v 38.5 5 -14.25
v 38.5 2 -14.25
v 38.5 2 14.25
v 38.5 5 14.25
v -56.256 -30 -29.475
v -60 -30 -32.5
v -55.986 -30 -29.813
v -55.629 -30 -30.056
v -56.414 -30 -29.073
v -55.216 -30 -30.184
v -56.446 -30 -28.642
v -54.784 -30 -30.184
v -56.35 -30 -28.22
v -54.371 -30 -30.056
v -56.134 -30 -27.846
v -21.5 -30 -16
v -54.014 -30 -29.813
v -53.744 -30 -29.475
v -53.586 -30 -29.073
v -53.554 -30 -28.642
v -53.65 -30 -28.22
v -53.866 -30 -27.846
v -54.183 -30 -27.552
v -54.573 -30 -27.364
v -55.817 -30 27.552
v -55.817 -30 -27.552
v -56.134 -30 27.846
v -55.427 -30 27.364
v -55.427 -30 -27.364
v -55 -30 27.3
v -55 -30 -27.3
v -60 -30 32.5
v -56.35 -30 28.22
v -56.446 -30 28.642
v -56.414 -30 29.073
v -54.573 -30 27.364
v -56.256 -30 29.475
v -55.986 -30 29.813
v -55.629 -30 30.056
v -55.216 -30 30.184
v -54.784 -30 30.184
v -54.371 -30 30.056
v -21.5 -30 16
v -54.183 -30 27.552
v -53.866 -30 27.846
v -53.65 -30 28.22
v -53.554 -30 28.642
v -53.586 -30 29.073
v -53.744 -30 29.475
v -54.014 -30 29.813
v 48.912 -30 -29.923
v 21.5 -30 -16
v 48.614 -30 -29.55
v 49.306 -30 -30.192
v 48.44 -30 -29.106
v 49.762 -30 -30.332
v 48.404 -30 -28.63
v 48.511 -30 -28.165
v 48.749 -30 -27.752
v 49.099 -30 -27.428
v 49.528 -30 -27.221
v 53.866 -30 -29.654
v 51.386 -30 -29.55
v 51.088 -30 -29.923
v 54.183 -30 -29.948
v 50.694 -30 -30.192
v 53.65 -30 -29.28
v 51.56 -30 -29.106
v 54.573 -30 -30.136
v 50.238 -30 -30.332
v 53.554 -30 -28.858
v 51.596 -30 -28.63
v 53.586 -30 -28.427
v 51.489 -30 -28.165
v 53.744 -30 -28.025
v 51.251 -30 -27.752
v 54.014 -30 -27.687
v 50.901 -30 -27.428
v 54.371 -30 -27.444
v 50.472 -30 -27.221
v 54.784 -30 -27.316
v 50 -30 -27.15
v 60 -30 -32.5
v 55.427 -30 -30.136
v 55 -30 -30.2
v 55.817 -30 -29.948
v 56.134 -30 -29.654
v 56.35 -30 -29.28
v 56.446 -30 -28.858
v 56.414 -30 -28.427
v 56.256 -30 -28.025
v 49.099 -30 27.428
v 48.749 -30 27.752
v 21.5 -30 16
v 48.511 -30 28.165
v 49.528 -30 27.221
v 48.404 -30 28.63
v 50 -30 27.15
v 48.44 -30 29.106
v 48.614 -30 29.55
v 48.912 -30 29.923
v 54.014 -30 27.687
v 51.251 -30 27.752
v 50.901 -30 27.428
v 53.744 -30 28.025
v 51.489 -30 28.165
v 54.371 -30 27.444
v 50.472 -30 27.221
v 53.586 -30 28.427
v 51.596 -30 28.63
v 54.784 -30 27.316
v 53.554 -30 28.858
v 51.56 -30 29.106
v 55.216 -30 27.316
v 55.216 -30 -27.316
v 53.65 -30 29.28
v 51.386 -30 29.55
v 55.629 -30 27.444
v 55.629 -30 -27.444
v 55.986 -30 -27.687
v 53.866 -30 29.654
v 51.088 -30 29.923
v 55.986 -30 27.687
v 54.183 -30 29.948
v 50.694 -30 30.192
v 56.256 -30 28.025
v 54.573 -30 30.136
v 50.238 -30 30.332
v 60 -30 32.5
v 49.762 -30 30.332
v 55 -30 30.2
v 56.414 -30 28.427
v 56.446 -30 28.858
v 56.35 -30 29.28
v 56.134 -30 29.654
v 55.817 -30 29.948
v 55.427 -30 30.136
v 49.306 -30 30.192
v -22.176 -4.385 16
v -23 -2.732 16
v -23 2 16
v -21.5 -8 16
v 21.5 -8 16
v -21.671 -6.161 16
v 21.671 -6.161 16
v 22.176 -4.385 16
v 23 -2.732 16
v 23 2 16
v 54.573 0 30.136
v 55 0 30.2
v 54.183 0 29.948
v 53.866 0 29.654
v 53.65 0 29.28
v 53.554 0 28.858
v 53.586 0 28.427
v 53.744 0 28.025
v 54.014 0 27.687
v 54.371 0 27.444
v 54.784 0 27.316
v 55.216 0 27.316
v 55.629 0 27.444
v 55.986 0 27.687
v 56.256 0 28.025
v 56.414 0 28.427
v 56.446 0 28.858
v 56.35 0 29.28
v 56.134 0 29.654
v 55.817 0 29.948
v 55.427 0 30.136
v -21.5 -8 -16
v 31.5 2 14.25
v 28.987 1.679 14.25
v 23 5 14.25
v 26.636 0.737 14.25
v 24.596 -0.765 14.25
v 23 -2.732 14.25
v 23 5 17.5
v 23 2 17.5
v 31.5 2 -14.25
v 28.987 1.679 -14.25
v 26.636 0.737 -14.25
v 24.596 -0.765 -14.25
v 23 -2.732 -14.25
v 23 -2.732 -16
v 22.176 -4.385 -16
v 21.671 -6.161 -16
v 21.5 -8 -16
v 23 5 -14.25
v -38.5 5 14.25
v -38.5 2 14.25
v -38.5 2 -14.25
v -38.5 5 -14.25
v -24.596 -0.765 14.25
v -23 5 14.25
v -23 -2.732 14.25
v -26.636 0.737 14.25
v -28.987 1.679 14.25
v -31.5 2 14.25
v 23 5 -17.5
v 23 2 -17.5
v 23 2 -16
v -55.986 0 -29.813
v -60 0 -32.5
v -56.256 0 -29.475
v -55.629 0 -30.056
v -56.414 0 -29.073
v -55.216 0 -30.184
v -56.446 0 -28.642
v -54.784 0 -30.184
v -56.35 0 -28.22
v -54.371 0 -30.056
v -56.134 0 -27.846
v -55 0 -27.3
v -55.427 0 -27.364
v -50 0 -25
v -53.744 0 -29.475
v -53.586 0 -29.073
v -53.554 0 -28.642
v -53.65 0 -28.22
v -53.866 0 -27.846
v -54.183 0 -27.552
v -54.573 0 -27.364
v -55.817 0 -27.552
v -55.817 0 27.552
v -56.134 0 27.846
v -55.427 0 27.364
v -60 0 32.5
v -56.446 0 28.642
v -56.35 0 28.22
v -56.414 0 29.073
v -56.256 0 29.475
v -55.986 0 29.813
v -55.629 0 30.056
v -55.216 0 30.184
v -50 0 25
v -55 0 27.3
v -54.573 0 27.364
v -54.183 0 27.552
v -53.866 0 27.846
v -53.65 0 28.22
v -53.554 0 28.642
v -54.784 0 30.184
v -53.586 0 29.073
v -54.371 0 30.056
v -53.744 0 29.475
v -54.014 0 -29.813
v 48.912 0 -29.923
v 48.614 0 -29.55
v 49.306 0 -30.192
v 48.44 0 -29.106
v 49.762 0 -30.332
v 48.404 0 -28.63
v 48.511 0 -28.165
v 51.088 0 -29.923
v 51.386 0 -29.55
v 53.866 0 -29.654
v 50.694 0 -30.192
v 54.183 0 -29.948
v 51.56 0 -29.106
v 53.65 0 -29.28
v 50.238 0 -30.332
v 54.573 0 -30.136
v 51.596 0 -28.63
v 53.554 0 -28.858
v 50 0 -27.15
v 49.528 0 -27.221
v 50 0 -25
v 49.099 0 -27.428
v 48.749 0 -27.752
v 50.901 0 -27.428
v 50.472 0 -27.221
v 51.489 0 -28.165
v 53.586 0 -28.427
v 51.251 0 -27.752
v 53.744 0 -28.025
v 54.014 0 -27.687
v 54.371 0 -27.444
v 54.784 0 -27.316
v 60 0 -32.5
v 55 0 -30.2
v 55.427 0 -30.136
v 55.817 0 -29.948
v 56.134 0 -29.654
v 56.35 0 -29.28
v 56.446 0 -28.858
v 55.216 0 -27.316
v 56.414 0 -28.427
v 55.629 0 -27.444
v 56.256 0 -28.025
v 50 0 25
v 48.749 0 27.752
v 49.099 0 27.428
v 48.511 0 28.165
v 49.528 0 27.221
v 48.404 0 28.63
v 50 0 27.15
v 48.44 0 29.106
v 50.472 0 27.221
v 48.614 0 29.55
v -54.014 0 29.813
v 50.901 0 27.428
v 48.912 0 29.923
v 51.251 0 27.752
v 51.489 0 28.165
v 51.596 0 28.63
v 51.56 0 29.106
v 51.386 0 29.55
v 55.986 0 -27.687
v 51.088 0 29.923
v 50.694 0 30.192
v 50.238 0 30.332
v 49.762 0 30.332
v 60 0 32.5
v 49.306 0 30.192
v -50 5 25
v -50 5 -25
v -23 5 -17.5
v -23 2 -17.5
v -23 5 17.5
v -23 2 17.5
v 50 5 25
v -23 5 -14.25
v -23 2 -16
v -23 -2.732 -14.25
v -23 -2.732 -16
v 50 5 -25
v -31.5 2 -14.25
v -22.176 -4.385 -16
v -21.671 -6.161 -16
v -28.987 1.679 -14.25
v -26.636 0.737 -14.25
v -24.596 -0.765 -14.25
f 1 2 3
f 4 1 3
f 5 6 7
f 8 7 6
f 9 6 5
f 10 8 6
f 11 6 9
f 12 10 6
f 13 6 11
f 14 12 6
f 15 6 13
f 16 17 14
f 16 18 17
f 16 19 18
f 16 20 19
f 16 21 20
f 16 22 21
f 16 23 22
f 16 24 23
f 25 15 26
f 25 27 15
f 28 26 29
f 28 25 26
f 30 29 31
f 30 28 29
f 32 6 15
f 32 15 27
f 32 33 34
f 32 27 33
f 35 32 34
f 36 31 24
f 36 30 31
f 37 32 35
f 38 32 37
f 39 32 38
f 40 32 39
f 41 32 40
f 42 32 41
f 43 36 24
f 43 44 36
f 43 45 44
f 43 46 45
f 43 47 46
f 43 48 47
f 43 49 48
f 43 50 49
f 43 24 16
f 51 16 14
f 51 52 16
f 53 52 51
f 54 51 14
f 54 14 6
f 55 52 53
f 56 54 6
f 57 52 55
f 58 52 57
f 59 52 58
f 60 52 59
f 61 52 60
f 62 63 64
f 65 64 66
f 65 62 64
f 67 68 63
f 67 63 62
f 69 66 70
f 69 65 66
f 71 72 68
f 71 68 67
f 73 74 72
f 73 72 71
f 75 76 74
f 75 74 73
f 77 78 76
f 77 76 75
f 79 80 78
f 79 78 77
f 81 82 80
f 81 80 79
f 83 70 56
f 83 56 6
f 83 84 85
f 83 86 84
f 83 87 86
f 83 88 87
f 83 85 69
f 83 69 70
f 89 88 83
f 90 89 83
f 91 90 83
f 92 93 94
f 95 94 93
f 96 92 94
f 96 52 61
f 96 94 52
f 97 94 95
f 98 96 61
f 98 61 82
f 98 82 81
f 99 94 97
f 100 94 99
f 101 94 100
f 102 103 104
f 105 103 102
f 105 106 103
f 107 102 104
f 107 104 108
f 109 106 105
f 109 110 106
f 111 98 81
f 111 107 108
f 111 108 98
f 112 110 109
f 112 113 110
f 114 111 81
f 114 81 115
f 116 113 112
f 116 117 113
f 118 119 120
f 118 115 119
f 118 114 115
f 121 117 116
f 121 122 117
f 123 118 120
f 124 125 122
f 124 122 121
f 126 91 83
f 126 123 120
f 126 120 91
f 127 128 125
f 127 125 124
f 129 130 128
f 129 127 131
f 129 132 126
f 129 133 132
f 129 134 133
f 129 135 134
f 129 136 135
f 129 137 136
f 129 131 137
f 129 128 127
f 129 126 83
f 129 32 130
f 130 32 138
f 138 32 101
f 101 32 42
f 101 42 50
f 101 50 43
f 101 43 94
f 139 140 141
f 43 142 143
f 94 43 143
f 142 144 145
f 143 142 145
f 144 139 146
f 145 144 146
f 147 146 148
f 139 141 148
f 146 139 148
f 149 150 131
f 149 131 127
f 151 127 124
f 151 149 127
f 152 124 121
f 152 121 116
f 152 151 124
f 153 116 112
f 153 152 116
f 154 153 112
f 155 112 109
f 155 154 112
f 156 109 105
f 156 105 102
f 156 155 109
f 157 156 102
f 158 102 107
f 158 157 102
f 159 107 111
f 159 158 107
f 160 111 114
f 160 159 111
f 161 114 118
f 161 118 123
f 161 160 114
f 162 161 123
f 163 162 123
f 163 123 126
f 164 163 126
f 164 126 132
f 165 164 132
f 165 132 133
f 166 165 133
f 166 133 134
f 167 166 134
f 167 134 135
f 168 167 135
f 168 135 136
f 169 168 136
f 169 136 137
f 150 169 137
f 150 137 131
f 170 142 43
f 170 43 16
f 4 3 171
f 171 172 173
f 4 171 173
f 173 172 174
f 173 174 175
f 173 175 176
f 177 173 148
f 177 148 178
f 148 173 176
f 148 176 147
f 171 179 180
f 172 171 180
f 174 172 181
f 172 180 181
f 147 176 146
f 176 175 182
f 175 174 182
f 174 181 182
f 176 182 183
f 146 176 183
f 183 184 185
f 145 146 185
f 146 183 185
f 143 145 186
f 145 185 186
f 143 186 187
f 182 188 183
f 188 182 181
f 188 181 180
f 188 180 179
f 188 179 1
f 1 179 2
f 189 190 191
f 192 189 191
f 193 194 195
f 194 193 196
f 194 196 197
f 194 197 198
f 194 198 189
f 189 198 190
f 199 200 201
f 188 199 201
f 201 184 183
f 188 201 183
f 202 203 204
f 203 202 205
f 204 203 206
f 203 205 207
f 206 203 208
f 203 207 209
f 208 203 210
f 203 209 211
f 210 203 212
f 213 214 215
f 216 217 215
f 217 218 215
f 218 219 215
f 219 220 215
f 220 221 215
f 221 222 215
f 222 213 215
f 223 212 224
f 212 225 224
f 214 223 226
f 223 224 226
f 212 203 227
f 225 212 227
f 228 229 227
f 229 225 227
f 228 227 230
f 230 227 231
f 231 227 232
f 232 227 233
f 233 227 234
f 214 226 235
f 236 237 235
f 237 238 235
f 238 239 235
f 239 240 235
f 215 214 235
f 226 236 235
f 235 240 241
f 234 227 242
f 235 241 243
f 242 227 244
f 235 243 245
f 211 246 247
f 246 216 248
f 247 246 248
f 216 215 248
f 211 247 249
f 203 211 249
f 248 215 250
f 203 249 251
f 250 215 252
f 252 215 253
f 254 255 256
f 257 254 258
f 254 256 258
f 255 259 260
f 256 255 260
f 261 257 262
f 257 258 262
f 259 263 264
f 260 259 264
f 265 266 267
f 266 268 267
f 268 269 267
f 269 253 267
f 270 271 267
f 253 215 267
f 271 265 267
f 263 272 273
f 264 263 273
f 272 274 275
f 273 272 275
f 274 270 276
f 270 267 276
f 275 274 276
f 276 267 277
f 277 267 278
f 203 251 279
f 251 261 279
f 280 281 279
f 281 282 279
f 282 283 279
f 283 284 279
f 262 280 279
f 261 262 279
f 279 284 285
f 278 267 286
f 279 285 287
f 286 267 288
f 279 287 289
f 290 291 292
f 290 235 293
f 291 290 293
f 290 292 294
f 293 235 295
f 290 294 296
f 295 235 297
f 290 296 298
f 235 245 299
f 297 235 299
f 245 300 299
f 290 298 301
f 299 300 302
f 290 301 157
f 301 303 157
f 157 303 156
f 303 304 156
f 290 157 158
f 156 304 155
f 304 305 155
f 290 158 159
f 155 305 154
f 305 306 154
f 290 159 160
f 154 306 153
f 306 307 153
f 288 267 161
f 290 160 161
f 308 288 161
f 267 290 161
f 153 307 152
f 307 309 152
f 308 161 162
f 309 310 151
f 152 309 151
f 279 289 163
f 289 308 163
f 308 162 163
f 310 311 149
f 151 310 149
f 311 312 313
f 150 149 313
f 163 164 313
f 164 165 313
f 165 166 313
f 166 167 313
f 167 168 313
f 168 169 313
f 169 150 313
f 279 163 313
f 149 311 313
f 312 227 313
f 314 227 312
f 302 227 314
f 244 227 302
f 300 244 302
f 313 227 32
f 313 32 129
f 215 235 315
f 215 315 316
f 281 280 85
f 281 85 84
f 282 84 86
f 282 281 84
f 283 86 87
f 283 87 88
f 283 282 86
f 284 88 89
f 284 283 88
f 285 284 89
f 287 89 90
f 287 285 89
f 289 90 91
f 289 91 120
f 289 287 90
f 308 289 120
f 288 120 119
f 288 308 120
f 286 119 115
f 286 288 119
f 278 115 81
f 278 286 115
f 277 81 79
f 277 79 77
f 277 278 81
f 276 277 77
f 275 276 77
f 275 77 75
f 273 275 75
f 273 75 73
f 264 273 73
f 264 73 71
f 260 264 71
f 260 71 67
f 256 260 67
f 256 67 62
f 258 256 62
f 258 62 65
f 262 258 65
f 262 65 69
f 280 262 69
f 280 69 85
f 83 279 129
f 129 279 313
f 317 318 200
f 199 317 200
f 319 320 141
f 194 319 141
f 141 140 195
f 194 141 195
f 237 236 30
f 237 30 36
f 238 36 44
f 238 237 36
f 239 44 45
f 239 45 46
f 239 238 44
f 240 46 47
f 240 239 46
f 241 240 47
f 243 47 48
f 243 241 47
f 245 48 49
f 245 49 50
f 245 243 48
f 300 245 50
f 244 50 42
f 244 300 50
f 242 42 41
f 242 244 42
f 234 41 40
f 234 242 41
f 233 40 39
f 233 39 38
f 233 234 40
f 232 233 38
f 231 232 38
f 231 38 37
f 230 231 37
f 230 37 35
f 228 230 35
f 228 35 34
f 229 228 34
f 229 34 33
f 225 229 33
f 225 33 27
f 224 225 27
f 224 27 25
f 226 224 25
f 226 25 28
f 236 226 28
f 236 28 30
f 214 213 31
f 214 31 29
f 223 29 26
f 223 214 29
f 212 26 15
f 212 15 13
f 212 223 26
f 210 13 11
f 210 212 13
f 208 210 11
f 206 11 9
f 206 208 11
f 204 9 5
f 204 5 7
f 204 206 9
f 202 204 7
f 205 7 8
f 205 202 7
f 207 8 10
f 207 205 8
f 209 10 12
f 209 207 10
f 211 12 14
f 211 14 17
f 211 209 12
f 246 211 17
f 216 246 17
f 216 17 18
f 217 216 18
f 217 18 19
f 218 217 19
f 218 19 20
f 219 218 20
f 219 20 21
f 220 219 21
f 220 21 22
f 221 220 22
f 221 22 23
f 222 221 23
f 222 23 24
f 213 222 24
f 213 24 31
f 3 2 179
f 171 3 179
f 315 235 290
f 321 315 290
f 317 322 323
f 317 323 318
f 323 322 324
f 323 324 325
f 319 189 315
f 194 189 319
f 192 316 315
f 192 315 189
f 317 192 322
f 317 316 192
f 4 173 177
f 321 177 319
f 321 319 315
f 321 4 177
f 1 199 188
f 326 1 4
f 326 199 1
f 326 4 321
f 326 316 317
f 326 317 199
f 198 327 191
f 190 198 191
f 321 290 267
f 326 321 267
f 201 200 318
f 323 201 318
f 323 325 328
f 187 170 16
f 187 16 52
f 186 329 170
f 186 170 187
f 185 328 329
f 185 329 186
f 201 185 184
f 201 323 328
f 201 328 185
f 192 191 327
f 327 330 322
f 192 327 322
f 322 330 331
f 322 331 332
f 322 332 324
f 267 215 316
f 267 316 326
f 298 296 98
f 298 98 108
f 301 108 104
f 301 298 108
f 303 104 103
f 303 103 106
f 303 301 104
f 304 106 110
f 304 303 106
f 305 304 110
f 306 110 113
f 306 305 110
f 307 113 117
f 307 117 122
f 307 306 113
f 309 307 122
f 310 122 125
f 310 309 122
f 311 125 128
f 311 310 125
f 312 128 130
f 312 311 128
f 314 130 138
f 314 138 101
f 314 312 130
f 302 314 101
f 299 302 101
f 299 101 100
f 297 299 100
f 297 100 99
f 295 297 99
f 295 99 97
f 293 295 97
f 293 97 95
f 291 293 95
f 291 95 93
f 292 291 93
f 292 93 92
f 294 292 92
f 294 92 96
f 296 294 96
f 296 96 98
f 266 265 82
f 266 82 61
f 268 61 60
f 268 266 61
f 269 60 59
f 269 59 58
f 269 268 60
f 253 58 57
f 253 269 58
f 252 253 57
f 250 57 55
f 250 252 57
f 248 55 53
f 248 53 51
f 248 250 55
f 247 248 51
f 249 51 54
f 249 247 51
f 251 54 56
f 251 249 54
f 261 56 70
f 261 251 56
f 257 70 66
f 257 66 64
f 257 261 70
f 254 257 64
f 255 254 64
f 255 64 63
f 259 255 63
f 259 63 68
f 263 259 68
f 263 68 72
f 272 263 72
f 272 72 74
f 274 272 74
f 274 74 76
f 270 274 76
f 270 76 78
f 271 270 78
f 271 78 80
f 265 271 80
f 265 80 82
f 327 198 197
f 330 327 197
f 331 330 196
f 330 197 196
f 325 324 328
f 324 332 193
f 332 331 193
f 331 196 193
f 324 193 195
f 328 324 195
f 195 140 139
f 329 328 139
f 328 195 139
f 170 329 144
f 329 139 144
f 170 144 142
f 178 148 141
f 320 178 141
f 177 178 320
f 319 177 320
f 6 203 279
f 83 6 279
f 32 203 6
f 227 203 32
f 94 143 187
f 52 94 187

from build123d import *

# Parameters (mm, degrees)
BOSS_EXTRUDE3_DEPTH = 2
SKETCH1_6_W         = 100
SKETCH1_6_H         = 50
BOSS_EXTRUDE4_DEPTH = 5
SKETCH2_W           = 120
SKETCH2_H           = 65
SKETCH2_R           = 1.45
SKETCH2_R_2         = 1.6
BOSS_EXTRUDE5_DEPTH = 30
SKETCH2_2_W         = 120
SKETCH2_2_H         = 65
SKETCH2_2_R         = 1.45
SKETCH2_2_R_2       = 1.6
BOSS_EXTRUDE6_DEPTH = 3
CUT_EXTRUDE1_REACH  = 77.367
SKETCH7_W           = 43
SKETCH7_H           = 32
FILLET1_R           = 10


with BuildPart() as part:
    # Sketch1 → Boss-Extrude3 (new body)
    with BuildSketch(Plane(origin=(0, 0, 0), x_dir=(1, 0, 0), z_dir=(0, 1, 0))):
        Polygon((23, -14.25), (23, -17.5), (-23, -17.5), (-23, -14.25), (-38.5, -14.25), (-38.5, 14.25), (-23, 14.25), (-23, 17.5), (23, 17.5), (23, 14.25), (38.5, 14.25), (38.5, -14.25), align=None)
    extrude(amount=BOSS_EXTRUDE3_DEPTH)

    # Sketch1<6> → Boss-Extrude4 (add)
    with BuildSketch(Plane(origin=(0, 0, 0), x_dir=(1, 0, 0), z_dir=(0, 1, 0))):
        Rectangle(SKETCH1_6_W, SKETCH1_6_H)
        Polygon((23, -14.25), (23, -17.5), (-23, -17.5), (-23, -14.25), (-38.5, -14.25), (-38.5, 14.25), (-23, 14.25), (-23, 17.5), (23, 17.5), (23, 14.25), (38.5, 14.25), (38.5, -14.25), align=None, mode=Mode.SUBTRACT)
    extrude(amount=BOSS_EXTRUDE4_DEPTH)

    # Sketch2 → Boss-Extrude5 (add)
    with BuildSketch(Plane.XZ):
        Rectangle(SKETCH2_W, SKETCH2_H)
        with Locations(Location((-55, 28.75, 0), (0, 0, 270))):
            Circle(SKETCH2_R, mode=Mode.SUBTRACT)
        with Locations(Location((55, 28.75, 0), (0, 0, 90))):
            Circle(SKETCH2_R, mode=Mode.SUBTRACT)
        with Locations(Location((55, -28.75, 0), (0, 0, 270))):
            Circle(SKETCH2_R, mode=Mode.SUBTRACT)
        with Locations(Location((-55, -28.75, 0), (0, 0, 90))):
            Circle(SKETCH2_R, mode=Mode.SUBTRACT)
        with Locations(Location((50, 28.75, 0), (0, 0, 270))):
            Circle(SKETCH2_R_2, mode=Mode.SUBTRACT)
        with Locations(Location((50, -28.75, 0), (0, 0, 90))):
            Circle(SKETCH2_R_2, mode=Mode.SUBTRACT)
    extrude(amount=BOSS_EXTRUDE5_DEPTH)

    # Sketch2<2> → Boss-Extrude6 (add)
    with BuildSketch(Plane.XZ):
        Rectangle(SKETCH2_2_W, SKETCH2_2_H)
        with Locations(Location((-55, 28.75, 0), (0, 0, 270))):
            Circle(SKETCH2_2_R, mode=Mode.SUBTRACT)
        with Locations(Location((55, 28.75, 0), (0, 0, 90))):
            Circle(SKETCH2_2_R, mode=Mode.SUBTRACT)
        with Locations(Location((55, -28.75, 0), (0, 0, 270))):
            Circle(SKETCH2_2_R, mode=Mode.SUBTRACT)
        with Locations(Location((-55, -28.75, 0), (0, 0, 90))):
            Circle(SKETCH2_2_R, mode=Mode.SUBTRACT)
        with Locations(Location((50, 28.75, 0), (0, 0, 270))):
            Circle(SKETCH2_2_R_2, mode=Mode.SUBTRACT)
        with Locations(Location((50, -28.75, 0), (0, 0, 90))):
            Circle(SKETCH2_2_R_2, mode=Mode.SUBTRACT)
    extrude(amount=BOSS_EXTRUDE6_DEPTH)

    # Sketch7 → Cut-Extrude1 (cut, up to next)
    with BuildSketch(Plane(origin=(0, 2, 0), x_dir=(1, 0, 0), z_dir=(0, 1, 0)), mode=Mode.PRIVATE) as cut_extrude1_sk1:
        Rectangle(SKETCH7_W, SKETCH7_H)
    cut_extrude1_tool1 = extrude(cut_extrude1_sk1.sketch, amount=-CUT_EXTRUDE1_REACH, mode=Mode.PRIVATE) & part.part
    add(cut_extrude1_tool1.solids().sort_by_distance((0, 2, 0))[0], mode=Mode.SUBTRACT)

    # Fillet1
    # the kernel refuses this fillet: 10 mm, written as the material it takes off along each edge
    with BuildSketch(Plane(origin=(-21.5, 2, 16), x_dir=(0, -1, 0), z_dir=(0, 0, -1))) as fillet1_piece_1_section:
        with BuildLine():
            CenterArc((FILLET1_R, FILLET1_R), FILLET1_R, 180, 90)
            Line((0, FILLET1_R), (0, 0))
            Line((0, 0), (FILLET1_R, 0))
        make_face()
    fillet1_piece_1 = extrude(amount=32, mode=Mode.PRIVATE)
    fillet1_piece_1 = split(fillet1_piece_1, bisect_by=Plane(origin=(-23, -2.387167078, 15.125), z_dir=(1, 0, 0)), keep=Keep.TOP, mode=Mode.PRIVATE)
    add(fillet1_piece_1, mode=Mode.SUBTRACT)
    with BuildSketch(Plane(origin=(-21.5, 2, 41), x_dir=(0, -1, 0), z_dir=(0, 0, -1))) as fillet1_piece_2_section:
        with BuildLine():
            CenterArc((FILLET1_R, FILLET1_R), FILLET1_R, 180, 90)
            Line((0, FILLET1_R), (0, 0))
            Line((0, 0), (FILLET1_R, 0))
        make_face()
    fillet1_piece_2 = extrude(amount=82, mode=Mode.PRIVATE)
    fillet1_piece_2 = split(fillet1_piece_2, bisect_by=Plane(origin=(-23.780995079, -0.852225246, -14.25), z_dir=(0, 0, 1)), keep=Keep.TOP, mode=Mode.PRIVATE)
    fillet1_piece_2 = split(fillet1_piece_2, bisect_by=Plane(origin=(-23.780995079, -0.852225246, 14.25), z_dir=(0, 0, -1)), keep=Keep.TOP, mode=Mode.PRIVATE)
    add(fillet1_piece_2, mode=Mode.SUBTRACT)
    with BuildSketch(Plane(origin=(21.5, 2, -16), x_dir=(0, -1, 0), z_dir=(0, 0, 1))) as fillet1_piece_3_section:
        with BuildLine():
            CenterArc((FILLET1_R, FILLET1_R), FILLET1_R, 180, 90)
            Line((0, FILLET1_R), (0, 0))
            Line((0, 0), (FILLET1_R, 0))
        make_face()
    fillet1_piece_3 = extrude(amount=32, mode=Mode.PRIVATE)
    fillet1_piece_3 = split(fillet1_piece_3, bisect_by=Plane(origin=(23, -2.387167078, -15.125), z_dir=(-1, 0, 0)), keep=Keep.TOP, mode=Mode.PRIVATE)
    add(fillet1_piece_3, mode=Mode.SUBTRACT)
    with BuildSketch(Plane(origin=(21.5, 2, -41), x_dir=(0, -1, 0), z_dir=(0, 0, 1))) as fillet1_piece_4_section:
        with BuildLine():
            CenterArc((FILLET1_R, FILLET1_R), FILLET1_R, 180, 90)
            Line((0, FILLET1_R), (0, 0))
            Line((0, 0), (FILLET1_R, 0))
        make_face()
    fillet1_piece_4 = extrude(amount=82, mode=Mode.PRIVATE)
    fillet1_piece_4 = split(fillet1_piece_4, bisect_by=Plane(origin=(23.780995079, -0.852225246, 14.25), z_dir=(0, 0, -1)), keep=Keep.TOP, mode=Mode.PRIVATE)
    fillet1_piece_4 = split(fillet1_piece_4, bisect_by=Plane(origin=(23.780995079, -0.852225246, -14.25), z_dir=(0, 0, 1)), keep=Keep.TOP, mode=Mode.PRIVATE)
    add(fillet1_piece_4, mode=Mode.SUBTRACT)


solid = part.part
